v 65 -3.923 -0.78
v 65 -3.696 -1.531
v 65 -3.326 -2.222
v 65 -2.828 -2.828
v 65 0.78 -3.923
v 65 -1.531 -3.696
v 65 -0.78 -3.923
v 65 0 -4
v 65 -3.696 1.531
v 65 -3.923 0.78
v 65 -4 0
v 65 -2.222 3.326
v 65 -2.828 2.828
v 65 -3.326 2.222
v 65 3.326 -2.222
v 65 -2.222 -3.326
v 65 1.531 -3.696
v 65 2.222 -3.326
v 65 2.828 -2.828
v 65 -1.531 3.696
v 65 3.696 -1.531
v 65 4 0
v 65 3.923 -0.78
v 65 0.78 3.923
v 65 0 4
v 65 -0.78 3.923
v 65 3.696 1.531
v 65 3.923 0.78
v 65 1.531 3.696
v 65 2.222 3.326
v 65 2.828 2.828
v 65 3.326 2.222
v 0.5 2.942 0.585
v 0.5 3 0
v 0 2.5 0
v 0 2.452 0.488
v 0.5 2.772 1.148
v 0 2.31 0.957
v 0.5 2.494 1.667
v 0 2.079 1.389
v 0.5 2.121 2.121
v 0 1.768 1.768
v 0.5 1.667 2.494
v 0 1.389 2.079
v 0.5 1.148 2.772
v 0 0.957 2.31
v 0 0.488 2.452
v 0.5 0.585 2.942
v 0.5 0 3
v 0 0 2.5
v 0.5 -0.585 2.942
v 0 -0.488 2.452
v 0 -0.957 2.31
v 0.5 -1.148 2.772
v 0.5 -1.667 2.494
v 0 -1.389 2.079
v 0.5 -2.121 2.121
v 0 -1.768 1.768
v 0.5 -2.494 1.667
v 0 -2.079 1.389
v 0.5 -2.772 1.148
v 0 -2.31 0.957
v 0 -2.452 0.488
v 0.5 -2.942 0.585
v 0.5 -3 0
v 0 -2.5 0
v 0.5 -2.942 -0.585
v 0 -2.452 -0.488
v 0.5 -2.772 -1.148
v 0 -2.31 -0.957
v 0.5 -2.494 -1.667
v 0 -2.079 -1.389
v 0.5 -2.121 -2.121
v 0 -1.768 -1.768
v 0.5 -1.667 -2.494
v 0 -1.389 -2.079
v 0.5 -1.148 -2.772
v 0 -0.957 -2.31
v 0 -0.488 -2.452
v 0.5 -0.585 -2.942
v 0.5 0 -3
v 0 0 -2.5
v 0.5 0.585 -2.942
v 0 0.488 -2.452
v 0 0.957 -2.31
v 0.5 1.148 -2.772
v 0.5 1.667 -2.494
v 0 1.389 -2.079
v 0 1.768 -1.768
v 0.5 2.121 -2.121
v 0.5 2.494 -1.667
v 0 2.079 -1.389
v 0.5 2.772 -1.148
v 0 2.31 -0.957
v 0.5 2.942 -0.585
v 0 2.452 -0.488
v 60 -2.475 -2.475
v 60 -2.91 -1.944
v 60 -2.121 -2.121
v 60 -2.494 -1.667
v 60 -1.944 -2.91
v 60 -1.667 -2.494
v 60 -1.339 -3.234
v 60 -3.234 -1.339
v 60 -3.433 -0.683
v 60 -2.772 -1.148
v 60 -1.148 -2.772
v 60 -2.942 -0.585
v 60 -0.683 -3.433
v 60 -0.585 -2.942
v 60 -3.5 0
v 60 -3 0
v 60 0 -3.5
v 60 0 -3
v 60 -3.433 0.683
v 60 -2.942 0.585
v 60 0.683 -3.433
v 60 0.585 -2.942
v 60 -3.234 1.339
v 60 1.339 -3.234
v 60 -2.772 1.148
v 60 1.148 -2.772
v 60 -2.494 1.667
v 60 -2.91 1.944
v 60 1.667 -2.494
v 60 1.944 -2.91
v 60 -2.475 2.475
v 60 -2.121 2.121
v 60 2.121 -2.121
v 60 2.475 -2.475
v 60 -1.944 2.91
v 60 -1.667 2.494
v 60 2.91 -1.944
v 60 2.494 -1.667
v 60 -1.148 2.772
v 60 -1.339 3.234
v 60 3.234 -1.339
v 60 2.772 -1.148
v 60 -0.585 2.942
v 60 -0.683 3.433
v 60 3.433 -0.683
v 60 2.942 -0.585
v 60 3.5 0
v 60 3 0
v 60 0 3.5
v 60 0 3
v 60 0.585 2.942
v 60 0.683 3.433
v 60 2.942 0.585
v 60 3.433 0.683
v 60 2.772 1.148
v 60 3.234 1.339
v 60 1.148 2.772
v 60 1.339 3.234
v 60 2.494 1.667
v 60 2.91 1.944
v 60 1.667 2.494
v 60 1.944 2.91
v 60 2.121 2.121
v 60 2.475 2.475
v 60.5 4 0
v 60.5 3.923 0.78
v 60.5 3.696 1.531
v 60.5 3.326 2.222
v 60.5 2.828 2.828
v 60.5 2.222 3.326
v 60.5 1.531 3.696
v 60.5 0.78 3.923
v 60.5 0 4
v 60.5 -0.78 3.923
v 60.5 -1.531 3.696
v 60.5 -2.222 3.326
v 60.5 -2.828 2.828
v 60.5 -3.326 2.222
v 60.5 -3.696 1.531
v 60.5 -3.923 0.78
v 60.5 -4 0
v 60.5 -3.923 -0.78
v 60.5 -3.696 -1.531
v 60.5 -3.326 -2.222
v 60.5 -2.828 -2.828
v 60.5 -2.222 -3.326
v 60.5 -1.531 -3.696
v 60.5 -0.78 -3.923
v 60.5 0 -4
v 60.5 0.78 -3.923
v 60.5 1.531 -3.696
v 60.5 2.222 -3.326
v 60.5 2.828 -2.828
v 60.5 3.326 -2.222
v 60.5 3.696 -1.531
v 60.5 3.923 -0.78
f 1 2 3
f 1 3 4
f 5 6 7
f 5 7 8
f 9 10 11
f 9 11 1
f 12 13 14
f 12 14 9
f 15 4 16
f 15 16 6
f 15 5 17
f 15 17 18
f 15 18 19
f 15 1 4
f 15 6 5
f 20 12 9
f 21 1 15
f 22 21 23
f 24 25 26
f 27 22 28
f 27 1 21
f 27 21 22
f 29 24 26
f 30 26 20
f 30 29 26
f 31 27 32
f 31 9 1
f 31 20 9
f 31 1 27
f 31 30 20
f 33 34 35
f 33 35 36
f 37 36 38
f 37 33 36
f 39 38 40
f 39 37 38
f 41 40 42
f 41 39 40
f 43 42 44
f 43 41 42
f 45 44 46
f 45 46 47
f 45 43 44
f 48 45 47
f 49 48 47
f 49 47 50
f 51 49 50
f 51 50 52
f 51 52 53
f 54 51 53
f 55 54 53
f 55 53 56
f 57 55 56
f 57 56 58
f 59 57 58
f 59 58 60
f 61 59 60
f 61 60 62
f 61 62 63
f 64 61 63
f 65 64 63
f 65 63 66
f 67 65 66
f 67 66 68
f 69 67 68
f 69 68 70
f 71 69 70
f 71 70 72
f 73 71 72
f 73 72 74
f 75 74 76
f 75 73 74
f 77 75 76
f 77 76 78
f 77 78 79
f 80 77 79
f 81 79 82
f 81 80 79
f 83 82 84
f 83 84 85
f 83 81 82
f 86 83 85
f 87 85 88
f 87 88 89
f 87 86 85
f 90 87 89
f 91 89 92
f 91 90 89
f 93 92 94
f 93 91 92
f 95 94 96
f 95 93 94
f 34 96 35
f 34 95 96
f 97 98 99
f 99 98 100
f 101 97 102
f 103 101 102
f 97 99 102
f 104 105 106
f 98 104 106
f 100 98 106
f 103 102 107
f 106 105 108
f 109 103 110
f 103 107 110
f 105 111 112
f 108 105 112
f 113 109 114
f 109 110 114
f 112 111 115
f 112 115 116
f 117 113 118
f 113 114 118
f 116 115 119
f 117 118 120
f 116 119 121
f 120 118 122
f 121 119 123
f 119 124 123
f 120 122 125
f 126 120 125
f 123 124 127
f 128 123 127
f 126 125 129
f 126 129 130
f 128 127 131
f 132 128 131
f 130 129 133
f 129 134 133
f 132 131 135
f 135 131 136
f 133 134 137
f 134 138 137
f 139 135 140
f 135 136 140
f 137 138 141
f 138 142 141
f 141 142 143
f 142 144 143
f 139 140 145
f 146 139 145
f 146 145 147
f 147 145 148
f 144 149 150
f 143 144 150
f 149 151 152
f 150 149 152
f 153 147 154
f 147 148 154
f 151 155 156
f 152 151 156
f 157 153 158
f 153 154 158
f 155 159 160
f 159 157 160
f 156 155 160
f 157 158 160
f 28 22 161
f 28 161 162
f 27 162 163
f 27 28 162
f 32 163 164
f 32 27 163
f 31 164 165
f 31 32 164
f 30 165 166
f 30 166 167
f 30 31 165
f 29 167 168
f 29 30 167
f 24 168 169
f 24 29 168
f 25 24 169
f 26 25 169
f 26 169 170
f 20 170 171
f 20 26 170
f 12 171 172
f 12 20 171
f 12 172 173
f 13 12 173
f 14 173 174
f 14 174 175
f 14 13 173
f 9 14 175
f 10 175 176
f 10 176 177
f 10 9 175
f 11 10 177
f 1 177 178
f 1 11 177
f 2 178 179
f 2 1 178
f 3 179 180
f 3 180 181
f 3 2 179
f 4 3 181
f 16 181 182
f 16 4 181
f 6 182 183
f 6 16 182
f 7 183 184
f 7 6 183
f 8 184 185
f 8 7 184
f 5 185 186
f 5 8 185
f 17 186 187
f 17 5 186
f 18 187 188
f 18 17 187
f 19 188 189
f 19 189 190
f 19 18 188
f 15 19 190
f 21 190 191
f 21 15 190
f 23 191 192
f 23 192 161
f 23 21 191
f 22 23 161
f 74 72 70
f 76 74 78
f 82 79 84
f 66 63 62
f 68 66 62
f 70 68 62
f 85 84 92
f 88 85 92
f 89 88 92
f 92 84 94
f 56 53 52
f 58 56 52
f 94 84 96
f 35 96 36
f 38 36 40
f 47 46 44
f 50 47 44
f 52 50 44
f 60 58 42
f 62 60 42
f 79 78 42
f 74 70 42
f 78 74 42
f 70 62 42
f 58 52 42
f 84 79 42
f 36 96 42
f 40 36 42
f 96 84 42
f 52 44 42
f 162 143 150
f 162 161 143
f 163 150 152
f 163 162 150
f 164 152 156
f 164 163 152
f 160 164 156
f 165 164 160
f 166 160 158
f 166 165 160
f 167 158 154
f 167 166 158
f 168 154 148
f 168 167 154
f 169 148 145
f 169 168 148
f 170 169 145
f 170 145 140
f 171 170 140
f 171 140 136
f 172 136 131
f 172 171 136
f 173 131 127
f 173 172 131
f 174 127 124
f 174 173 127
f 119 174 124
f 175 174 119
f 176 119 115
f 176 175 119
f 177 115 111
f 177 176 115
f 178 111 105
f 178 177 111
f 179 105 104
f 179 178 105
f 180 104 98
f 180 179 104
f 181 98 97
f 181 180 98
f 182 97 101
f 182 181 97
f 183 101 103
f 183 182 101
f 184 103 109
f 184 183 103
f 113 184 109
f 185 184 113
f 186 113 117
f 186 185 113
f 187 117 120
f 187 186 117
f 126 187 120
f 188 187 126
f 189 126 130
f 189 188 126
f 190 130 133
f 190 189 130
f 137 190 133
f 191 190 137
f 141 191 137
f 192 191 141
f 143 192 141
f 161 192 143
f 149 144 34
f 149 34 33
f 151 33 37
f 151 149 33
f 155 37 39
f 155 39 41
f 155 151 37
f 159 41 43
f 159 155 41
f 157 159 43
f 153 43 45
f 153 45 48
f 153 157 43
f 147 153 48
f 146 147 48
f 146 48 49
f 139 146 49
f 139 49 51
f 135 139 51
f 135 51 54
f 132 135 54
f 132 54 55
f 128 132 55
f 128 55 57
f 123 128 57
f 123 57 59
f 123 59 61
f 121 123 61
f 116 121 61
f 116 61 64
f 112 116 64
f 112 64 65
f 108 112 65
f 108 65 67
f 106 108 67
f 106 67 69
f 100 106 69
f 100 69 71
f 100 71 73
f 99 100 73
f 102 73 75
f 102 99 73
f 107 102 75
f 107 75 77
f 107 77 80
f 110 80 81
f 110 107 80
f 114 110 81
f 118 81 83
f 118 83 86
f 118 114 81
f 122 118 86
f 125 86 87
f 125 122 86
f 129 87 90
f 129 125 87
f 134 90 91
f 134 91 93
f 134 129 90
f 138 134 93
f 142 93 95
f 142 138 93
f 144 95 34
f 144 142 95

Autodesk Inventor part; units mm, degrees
ref_plane "Start Plane" through (0, 0, 0) normal (1, 0, 0) x (0, 1, 0)
ref_plane "XZ Plane" through (0, 0, 0) normal (0, 1, 0) x (-1, 0, 0)
ref_plane "XY Plane" through (0, 0, 0) normal (0, 0, 1) x (1, 0, 0)
sketch "Main Sketch" plane through (0, 0, 0) normal (0, 0, 1) x (1, 0, 0)
  line L0 (0, 0) -> (65, 0)
  line L1 (0, 0) -> (0, 3)
  line L2 (0, 3) -> (60, 3)
  line L3 (60, 3) -> (60, 4)
  line L4 (65, 4) -> (65, 0)
  line L5 (60, 4) -> (65, 4)
  dimension "d3" = 6
  dimension "d4" = 8
revolve "Revolution1" add sketch "Main Sketch" angle 360 about axis through (0, 0, 0) along (1, 0, 0)
chamfer "Chamfer1" distance 0.5 angle 45 1 edges at (0, -3, 0) measured on face at (40, 2.9903, -0.2414)
chamfer "Chamfer2" distance 0.5 angle 45 1 edges at (60, -4, 0) measured on face at (63.3333, 3.9482, -0.6416)
equation "\"Length\" = 65"
properties part number "Shaft" material "Steel"
